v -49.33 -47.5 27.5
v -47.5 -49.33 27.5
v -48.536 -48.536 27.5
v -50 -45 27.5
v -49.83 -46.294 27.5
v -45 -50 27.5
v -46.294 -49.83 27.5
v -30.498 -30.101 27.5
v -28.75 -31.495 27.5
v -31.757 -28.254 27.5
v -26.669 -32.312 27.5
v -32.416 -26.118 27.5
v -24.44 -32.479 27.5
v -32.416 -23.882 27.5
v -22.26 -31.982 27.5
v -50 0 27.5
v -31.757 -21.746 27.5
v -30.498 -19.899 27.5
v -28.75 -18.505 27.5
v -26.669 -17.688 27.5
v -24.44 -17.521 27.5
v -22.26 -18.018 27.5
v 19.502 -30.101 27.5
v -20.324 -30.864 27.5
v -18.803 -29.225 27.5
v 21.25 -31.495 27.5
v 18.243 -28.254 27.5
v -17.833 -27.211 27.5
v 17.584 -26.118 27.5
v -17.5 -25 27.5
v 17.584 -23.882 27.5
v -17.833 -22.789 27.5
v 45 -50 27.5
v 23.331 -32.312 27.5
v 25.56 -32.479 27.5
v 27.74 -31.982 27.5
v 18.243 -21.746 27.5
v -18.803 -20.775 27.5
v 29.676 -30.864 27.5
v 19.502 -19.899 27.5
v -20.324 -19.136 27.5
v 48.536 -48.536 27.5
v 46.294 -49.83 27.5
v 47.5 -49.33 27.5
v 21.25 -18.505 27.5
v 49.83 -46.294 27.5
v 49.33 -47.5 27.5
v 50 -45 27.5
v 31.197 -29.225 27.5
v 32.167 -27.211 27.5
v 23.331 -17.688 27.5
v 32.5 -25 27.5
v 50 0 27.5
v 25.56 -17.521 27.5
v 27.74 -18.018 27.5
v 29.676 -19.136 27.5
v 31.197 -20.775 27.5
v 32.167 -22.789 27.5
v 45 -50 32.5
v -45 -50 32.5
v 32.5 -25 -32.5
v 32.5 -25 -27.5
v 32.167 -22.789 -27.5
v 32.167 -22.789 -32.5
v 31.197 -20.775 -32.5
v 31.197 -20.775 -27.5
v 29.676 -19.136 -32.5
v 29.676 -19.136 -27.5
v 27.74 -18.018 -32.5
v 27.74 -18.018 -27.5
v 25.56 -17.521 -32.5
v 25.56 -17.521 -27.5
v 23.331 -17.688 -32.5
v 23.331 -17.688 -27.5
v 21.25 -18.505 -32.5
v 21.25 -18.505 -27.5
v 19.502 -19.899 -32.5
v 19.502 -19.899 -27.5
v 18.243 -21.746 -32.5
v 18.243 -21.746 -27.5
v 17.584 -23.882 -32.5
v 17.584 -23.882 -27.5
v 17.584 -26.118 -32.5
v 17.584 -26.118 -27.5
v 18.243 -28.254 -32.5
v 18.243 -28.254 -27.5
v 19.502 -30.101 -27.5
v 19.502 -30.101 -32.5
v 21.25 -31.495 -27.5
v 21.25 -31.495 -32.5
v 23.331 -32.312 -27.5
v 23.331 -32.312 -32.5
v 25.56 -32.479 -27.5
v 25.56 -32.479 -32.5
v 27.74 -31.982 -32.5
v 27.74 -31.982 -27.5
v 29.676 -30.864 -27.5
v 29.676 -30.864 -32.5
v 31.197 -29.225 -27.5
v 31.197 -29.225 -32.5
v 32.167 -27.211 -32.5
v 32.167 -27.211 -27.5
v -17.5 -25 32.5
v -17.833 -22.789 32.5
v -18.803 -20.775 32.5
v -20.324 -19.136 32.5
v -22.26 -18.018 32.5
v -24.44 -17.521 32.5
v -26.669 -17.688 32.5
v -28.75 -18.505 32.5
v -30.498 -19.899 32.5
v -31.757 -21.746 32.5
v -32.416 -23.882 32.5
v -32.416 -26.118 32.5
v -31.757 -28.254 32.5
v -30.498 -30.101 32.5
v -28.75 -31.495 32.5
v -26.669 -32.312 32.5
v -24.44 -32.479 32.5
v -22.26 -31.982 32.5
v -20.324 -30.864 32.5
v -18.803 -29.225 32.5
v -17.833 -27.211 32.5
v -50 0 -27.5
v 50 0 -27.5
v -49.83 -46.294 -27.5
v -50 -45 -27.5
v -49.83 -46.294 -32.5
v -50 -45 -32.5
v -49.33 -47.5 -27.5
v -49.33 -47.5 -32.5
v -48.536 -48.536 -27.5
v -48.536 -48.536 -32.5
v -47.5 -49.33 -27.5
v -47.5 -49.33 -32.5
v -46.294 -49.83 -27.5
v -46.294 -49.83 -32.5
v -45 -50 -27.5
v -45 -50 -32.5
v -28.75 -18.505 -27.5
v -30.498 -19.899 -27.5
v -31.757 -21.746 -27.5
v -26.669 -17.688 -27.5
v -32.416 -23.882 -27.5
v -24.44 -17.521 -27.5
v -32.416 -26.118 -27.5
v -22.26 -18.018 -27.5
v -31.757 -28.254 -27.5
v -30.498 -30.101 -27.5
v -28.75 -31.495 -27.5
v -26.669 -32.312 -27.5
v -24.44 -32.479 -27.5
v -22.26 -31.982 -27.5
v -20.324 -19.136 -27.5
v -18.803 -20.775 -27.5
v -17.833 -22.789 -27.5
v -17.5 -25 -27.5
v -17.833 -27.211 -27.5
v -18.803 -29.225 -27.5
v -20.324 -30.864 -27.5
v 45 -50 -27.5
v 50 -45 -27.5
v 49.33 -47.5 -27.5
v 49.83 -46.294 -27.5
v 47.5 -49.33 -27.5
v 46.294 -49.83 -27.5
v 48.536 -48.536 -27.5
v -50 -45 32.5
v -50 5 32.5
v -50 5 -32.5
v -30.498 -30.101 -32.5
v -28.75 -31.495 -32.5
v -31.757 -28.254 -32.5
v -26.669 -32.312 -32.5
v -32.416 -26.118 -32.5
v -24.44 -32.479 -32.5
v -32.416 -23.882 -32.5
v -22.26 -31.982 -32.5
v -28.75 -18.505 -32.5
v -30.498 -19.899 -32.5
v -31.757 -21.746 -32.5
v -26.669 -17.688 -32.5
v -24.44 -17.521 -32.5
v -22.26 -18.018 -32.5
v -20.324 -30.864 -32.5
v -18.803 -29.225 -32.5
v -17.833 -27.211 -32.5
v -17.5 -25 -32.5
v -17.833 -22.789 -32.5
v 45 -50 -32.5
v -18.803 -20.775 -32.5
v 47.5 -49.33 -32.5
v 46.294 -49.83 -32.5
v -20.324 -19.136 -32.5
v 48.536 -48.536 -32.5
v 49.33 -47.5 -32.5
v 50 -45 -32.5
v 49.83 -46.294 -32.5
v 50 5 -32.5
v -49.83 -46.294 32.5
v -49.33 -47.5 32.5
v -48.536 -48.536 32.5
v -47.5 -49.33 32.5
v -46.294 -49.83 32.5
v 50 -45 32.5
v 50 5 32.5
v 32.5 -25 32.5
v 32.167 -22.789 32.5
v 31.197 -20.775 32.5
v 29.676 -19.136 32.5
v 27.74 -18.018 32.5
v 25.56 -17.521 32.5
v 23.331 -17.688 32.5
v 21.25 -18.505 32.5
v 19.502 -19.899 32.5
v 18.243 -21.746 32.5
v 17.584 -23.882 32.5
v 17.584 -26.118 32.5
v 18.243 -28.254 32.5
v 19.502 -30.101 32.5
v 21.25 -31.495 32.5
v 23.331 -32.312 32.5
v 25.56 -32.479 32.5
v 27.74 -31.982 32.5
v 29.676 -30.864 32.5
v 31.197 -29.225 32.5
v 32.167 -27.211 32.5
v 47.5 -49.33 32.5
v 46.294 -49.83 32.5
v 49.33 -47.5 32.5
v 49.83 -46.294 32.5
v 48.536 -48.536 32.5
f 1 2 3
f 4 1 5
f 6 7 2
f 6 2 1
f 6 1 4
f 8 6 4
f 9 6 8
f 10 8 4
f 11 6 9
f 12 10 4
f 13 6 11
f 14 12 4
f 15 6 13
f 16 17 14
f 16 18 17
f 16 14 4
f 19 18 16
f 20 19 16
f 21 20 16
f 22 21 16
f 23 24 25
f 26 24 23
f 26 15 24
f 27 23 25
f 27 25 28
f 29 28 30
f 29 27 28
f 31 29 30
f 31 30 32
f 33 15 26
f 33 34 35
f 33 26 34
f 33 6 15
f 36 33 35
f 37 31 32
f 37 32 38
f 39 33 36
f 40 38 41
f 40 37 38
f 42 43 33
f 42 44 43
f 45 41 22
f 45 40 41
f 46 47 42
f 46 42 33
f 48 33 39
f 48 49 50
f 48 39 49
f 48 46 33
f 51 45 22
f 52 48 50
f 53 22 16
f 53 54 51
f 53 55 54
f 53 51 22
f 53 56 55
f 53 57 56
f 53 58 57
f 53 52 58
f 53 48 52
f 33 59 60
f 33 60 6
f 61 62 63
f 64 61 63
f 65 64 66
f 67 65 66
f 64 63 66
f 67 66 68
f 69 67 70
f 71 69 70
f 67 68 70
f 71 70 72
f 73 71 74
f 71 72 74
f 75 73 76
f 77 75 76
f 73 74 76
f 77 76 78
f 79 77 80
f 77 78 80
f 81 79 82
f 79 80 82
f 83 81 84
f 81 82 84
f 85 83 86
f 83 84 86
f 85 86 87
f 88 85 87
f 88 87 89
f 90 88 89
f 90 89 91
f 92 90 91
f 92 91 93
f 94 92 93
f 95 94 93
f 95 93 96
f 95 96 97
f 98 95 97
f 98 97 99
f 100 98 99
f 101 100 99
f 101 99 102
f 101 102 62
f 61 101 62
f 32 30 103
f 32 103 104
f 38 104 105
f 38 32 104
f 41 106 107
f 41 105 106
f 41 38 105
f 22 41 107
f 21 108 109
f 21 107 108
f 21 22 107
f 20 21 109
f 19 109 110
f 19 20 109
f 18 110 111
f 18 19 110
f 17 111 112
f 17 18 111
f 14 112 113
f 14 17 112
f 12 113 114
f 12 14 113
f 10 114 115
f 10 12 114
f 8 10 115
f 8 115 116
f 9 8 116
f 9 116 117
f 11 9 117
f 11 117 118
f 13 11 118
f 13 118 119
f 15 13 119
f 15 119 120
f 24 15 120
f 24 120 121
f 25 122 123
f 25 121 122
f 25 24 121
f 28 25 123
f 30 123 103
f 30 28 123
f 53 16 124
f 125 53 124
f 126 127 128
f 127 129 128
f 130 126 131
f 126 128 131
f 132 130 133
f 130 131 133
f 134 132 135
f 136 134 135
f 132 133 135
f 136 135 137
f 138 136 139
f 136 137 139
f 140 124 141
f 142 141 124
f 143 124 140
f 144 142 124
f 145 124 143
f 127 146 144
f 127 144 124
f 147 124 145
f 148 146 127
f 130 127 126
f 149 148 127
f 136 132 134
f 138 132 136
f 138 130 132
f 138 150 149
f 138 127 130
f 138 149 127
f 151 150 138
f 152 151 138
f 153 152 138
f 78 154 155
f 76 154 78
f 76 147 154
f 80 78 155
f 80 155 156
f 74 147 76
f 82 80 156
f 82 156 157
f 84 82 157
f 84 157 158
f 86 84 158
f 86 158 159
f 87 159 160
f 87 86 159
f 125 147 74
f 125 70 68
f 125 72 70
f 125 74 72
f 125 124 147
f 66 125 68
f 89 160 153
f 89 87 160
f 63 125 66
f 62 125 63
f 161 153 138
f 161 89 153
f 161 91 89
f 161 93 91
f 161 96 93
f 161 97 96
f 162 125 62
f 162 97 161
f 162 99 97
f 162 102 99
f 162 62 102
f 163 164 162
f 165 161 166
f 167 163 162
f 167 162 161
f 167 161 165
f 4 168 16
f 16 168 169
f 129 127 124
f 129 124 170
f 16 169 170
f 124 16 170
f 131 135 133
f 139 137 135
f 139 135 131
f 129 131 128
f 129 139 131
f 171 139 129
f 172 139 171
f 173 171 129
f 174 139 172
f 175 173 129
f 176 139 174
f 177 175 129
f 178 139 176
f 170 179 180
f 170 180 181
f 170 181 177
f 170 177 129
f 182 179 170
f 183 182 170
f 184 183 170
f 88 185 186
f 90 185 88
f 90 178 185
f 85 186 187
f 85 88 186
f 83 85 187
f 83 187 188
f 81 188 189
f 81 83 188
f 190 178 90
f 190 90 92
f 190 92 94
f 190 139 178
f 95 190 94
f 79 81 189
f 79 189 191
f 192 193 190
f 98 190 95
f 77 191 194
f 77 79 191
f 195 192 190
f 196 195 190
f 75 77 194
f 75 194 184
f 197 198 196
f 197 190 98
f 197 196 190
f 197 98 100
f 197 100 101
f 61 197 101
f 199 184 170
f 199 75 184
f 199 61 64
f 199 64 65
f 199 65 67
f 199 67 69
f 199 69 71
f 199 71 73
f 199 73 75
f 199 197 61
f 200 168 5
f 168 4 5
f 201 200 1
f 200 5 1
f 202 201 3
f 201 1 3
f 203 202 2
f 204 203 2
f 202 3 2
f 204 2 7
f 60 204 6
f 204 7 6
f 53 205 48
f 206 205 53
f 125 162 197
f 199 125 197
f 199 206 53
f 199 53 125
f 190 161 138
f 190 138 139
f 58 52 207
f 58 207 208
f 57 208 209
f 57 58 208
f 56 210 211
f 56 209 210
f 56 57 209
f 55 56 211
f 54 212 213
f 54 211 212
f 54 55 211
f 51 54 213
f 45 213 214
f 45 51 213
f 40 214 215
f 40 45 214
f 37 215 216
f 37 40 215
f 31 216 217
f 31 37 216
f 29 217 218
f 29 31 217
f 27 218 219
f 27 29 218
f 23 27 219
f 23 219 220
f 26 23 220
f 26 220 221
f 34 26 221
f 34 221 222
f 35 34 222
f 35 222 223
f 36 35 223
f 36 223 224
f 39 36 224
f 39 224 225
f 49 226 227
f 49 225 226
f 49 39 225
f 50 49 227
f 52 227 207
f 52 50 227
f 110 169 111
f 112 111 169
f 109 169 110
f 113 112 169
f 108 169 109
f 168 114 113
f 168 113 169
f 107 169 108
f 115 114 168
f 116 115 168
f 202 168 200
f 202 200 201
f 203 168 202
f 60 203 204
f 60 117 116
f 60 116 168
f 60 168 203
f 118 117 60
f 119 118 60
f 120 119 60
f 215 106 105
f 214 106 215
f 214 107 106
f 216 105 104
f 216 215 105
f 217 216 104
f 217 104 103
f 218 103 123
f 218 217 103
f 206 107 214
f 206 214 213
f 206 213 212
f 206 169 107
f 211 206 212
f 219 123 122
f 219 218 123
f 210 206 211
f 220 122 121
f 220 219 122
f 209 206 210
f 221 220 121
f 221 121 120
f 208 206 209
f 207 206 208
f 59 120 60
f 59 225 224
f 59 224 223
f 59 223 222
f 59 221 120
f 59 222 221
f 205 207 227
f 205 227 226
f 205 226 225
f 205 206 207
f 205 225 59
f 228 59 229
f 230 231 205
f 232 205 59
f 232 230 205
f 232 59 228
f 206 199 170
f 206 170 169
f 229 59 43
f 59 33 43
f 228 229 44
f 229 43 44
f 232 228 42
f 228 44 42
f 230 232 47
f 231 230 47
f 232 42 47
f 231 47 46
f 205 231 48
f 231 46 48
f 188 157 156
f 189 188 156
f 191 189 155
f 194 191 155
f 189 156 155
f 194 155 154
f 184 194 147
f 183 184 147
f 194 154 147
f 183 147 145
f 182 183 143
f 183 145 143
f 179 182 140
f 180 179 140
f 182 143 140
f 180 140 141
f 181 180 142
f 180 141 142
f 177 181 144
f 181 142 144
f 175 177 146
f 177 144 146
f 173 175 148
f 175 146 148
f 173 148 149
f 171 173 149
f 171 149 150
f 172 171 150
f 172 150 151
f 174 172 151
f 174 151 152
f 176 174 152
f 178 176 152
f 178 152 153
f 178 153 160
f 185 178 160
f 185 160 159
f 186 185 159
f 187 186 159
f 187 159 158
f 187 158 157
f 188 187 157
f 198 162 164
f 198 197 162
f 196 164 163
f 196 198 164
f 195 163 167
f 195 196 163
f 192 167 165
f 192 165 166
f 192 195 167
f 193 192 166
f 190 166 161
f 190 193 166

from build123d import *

# Parameters (mm, degrees)
EXTRUDE_THIN1_DEPTH     = 50
SKETCH2_R               = 7.5
CUT_EXTRUDE1_DEPTH      = 33.5
CUT_EXTRUDE1_DEPTH_BACK = 33.5
FILLET1_R               = 5


with BuildPart() as part:
    # Sketch1 → Extrude-Thin1 (new body, symmetric)
    with BuildSketch(Plane(origin=(0, 0, 0), x_dir=(0, 0, -1), z_dir=(1, 0, 0))):
        Polygon((-27.5, -50), (-27.5, 0), (27.5, 0), (27.5, -50), (32.5, -50), (32.5, 5), (-32.5, 5), (-32.5, -50), align=None)
    extrude(amount=EXTRUDE_THIN1_DEPTH, both=True)

    # Sketch2 → Cut-Extrude1 (cut, two sides)
    with BuildSketch(Plane.XY) as cut_extrude1_sk:
        with Locations((-25, -25)):
            Circle(SKETCH2_R)
        with Locations((25, -25)):
            Circle(SKETCH2_R)
    extrude(amount=CUT_EXTRUDE1_DEPTH, mode=Mode.SUBTRACT)
    extrude(cut_extrude1_sk.sketch, amount=-CUT_EXTRUDE1_DEPTH_BACK, mode=Mode.SUBTRACT)

    # Fillet1
    fillet1_edges = [part.edges().sort_by_distance(p)[0] for p in [
        (50, -50, 30),
        (50, -50, -30),
        (-50, -50, 30),
        (-50, -50, -30),
    ]]
    fillet(fillet1_edges, radius=FILLET1_R)


solid = part.part
